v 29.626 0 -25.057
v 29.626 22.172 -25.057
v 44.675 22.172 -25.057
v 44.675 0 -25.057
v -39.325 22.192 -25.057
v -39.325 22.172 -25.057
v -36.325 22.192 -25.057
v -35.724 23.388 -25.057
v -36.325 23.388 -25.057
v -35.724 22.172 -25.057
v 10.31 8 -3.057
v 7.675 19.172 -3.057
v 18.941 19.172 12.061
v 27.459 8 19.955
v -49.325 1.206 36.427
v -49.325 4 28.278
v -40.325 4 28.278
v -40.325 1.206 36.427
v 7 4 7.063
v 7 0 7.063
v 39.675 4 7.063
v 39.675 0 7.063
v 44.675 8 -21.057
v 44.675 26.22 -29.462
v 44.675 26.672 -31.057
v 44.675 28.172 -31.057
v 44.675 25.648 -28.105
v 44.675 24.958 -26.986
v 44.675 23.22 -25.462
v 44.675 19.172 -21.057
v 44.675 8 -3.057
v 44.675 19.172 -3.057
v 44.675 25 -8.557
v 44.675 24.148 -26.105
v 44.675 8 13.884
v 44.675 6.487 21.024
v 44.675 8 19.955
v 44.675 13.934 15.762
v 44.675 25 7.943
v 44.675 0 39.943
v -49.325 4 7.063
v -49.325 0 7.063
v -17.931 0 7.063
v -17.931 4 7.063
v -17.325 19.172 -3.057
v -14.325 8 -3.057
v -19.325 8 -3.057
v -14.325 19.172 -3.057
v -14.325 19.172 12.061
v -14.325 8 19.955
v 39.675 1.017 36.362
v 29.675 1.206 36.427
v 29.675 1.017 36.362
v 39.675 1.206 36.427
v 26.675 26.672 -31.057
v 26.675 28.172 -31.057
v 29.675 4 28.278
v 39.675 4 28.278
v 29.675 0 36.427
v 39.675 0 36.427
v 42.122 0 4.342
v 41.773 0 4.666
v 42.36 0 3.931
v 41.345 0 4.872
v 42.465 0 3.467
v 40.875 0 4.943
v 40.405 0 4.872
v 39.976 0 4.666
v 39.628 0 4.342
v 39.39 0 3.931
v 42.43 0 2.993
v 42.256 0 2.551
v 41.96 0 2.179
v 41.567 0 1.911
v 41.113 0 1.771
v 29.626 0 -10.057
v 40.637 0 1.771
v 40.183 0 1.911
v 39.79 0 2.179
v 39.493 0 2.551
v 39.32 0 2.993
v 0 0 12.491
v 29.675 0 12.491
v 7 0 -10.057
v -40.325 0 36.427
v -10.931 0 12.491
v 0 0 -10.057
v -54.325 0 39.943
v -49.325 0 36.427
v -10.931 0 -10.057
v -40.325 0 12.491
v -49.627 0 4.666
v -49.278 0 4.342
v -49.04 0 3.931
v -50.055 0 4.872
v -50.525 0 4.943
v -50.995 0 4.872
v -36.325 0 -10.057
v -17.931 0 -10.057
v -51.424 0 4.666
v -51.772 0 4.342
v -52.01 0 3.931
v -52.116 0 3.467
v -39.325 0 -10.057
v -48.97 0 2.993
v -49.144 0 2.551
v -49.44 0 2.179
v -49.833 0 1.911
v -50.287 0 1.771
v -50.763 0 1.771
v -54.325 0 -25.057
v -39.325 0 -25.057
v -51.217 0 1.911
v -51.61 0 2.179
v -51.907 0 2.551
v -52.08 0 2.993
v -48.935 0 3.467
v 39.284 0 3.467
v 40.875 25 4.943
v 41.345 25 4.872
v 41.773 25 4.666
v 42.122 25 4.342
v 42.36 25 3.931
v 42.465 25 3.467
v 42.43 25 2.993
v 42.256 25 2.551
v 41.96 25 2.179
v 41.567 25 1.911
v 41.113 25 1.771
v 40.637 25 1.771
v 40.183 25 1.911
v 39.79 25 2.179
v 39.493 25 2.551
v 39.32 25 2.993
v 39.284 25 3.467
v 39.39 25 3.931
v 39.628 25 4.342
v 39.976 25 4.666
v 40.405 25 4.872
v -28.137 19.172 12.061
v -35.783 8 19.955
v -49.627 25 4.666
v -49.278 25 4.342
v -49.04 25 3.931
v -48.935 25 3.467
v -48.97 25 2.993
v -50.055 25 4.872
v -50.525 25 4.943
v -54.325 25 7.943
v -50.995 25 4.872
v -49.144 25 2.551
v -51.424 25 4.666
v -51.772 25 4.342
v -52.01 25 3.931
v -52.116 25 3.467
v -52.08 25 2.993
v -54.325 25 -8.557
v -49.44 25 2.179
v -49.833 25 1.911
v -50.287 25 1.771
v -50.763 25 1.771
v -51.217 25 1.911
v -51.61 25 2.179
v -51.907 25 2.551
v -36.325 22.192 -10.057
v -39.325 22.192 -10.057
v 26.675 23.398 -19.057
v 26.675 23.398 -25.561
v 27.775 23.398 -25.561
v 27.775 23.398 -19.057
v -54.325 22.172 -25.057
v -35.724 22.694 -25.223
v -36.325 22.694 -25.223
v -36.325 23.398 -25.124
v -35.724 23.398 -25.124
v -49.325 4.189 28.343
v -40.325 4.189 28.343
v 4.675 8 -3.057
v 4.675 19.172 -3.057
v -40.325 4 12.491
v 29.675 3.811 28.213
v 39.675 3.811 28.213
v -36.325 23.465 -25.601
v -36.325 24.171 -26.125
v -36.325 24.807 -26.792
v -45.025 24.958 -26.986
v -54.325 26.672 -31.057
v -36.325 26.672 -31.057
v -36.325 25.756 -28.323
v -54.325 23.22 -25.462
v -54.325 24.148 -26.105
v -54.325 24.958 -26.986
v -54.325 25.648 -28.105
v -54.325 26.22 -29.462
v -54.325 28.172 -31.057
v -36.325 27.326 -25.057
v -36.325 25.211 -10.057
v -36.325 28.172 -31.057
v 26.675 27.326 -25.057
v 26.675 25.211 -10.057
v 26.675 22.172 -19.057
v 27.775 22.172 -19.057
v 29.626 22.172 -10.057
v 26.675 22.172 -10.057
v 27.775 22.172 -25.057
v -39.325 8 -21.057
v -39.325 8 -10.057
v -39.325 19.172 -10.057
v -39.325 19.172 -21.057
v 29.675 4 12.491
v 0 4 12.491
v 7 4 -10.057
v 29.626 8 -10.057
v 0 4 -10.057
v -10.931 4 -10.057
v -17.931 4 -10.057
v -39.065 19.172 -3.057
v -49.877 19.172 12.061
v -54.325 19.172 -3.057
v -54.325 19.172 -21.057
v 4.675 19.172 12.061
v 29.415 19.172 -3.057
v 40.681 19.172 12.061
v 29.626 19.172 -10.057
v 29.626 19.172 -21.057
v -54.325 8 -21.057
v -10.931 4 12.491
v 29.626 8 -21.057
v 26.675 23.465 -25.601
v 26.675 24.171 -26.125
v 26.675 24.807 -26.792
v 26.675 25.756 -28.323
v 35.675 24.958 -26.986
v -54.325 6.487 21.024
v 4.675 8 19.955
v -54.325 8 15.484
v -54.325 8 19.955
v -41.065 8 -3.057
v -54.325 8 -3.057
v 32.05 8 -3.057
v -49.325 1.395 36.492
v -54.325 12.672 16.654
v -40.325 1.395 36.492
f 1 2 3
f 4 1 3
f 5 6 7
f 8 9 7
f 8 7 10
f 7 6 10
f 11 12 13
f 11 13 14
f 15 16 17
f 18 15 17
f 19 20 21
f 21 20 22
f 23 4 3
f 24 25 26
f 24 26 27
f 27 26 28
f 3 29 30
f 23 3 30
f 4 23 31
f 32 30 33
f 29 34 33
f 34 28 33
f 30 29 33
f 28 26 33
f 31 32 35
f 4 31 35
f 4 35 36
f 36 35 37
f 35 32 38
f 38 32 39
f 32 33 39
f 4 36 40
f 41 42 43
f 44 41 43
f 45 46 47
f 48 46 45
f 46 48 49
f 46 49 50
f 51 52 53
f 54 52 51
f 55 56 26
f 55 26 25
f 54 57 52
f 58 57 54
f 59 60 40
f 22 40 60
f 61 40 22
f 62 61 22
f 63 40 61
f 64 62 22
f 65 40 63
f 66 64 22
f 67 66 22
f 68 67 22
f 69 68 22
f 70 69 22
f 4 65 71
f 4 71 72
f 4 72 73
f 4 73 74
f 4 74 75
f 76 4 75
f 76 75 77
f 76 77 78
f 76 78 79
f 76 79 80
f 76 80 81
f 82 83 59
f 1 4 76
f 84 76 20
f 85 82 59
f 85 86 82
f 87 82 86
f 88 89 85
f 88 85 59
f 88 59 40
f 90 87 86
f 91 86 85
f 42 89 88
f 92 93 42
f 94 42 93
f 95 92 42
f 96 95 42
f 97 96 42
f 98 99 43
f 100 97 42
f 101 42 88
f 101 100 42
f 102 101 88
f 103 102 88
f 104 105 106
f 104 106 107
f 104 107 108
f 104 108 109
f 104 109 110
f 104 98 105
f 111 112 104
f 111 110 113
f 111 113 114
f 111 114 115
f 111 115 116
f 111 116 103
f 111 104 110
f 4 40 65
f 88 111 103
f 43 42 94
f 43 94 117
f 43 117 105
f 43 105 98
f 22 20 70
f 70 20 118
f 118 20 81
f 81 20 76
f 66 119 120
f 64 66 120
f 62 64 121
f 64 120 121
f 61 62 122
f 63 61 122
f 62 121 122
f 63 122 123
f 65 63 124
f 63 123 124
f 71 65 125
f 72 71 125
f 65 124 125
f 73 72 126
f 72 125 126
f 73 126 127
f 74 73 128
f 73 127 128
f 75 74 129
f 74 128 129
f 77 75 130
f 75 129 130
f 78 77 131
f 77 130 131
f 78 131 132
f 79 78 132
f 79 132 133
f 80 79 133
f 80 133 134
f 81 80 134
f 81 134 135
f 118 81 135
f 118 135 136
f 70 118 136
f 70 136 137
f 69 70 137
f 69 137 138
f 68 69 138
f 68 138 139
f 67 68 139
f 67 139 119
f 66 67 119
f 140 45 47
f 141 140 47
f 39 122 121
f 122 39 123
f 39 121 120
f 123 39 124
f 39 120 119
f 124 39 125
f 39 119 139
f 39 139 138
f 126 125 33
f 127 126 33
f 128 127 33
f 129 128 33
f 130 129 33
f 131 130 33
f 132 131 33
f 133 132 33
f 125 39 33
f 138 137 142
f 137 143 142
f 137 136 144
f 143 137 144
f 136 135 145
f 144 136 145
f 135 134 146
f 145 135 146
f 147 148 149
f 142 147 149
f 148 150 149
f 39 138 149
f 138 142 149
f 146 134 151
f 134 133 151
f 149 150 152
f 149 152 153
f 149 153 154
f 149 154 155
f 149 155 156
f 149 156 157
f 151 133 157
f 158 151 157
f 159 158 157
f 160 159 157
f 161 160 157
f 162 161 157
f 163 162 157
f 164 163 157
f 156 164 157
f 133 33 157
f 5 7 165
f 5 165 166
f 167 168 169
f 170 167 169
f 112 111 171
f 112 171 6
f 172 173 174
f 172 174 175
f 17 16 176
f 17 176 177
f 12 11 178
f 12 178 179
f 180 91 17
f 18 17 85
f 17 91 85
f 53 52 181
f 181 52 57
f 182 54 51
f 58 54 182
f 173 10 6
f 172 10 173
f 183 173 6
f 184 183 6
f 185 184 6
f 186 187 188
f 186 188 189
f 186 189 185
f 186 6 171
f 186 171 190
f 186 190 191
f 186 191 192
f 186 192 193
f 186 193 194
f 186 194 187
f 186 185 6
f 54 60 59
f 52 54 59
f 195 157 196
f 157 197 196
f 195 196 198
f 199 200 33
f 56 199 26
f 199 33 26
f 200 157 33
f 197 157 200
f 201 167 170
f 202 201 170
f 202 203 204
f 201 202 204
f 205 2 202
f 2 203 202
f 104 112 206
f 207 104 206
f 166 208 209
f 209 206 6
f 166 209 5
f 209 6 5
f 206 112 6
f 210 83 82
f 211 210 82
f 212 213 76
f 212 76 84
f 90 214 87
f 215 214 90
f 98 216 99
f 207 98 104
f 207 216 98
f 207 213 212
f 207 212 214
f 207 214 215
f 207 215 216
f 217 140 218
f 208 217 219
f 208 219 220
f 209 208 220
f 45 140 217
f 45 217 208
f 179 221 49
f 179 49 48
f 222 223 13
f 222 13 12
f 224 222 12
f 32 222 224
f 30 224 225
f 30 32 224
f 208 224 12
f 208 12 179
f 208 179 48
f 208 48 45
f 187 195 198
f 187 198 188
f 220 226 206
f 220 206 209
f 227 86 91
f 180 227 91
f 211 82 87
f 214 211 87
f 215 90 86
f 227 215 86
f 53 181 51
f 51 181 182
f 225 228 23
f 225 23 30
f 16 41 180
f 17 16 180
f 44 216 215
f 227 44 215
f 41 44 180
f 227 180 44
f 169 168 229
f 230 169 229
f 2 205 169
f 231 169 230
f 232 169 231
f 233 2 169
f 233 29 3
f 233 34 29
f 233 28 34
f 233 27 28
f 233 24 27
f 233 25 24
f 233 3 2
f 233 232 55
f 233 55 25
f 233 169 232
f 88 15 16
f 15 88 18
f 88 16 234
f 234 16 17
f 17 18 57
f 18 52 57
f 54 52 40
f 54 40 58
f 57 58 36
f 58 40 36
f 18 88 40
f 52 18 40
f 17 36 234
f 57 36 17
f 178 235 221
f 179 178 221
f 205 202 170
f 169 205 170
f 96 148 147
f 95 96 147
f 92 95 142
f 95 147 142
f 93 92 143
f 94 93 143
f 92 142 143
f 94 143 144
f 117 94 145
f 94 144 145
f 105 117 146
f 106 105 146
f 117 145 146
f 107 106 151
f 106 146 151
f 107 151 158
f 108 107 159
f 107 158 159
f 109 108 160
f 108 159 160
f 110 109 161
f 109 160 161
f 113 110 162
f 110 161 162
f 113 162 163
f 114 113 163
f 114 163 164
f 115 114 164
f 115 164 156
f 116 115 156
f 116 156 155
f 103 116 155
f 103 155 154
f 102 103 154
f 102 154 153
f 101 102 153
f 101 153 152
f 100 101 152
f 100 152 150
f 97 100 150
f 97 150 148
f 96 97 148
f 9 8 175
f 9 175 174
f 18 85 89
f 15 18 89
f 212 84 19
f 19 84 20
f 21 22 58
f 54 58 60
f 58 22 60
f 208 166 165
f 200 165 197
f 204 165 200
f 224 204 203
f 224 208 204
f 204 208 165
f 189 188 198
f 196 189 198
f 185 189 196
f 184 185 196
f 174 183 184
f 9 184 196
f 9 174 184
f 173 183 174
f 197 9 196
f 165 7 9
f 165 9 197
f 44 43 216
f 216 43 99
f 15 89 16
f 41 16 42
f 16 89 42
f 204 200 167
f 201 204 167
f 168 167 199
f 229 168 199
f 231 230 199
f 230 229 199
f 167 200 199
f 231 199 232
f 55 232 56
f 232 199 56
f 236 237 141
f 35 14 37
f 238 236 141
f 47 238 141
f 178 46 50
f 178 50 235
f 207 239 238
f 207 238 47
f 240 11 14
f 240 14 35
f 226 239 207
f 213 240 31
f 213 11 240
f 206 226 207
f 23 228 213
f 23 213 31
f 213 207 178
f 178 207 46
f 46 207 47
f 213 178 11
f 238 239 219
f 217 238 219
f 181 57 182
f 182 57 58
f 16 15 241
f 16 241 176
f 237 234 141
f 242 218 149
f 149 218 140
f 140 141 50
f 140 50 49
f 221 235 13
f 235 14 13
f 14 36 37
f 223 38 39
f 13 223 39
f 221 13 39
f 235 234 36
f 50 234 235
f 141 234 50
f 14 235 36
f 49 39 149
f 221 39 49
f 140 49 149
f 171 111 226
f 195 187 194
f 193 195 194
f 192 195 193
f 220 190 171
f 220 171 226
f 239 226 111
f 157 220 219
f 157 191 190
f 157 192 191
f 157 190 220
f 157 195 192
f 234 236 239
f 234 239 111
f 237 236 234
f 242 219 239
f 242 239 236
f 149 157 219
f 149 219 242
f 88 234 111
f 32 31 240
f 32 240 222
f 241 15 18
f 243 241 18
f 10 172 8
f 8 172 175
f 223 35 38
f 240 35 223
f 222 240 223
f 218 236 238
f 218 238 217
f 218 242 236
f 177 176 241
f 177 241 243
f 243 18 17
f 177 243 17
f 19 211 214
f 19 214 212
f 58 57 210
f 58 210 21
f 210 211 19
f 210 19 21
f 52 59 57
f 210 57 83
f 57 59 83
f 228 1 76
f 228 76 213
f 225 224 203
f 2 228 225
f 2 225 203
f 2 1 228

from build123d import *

# Parameters (mm, degrees)
BOSS_EXTRUDE2_DEPTH      = 25
SKETCH4_W                = 18
SKETCH4_H                = 11.172071032
CUT_EXTRUDE1_DEPTH       = 110.64235231
BOSS_EXTRUDE3_DEPTH      = 99
SKETCH6_W                = 63
SKETCH6_H                = 15
CUT_EXTRUDE2_DEPTH       = 99
SKETCH7_R                = 1.595
CUT_EXTRUDE3_DEPTH       = 72.914344682
CUT_EXTRUDE6_DEPTH       = 52
CUT_SWEEP3_START         = -47.833237702
CUT_SWEEP3_DEPTH         = 41.493253901
CUT_SWEEP4_START         = 1.791784621
CUT_SWEEP4_DEPTH         = 40.904021271
SKETCH18_W               = 63
SKETCH18_H               = 6.0593335
CUT_EXTRUDE8_DEPTH       = 70.563104286
CUT_EXTRUDE11_DEPTH      = 39
CUT_EXTRUDE11_DEPTH_BACK = 5
SKETCH19_W               = 63
SKETCH19_H               = 3.899399546
CUT_EXTRUDE12_DEPTH      = 6
CUT_EXTRUDE12_DEPTH_BACK = 39
SKETCH21_W               = 63.499017214
SKETCH21_H               = 3.594283993
CUT_EXTRUDE13_DEPTH      = 19
CUT_EXTRUDE13_DEPTH_BACK = 39
SKETCH22_W               = 63
SKETCH22_H               = 0.482139274
SKETCH23_W               = 3
SKETCH23_H               = 22.172071032
CUT_EXTRUDE14_DEPTH      = 15
SKETCH24_W               = 3
SKETCH24_H               = 22.191771217
CUT_EXTRUDE15_DEPTH      = 15
CUT_EXTRUDE16_DEPTH      = 4
SKETCH27_W               = 10
SKETCH27_H               = 8.614733054
BOSS_EXTRUDE5_DEPTH      = 0.2
SKETCH28_W               = 9
SKETCH28_H               = 8.614733054
BOSS_EXTRUDE6_DEPTH      = 0.2


with BuildPart() as part:
    # Sketch1 → Boss-Extrude2 (new body)
    with BuildSketch(Plane(origin=(0, 0, 0), x_dir=(1, 0, 0), z_dir=(0, 1, 0))):
        Polygon((26.674798416, 25.056972824), (44.674798416, 25.056972824), (44.674798416, -39.943027176), (-54.325201584, -39.943027176), (-54.325201584, 25.056972824), (-36.325201584, 25.056972824), (-36.325201584, 10.056972824), (26.674798416, 10.056972824), align=None)
    extrude(amount=BOSS_EXTRUDE2_DEPTH)

    # Sketch4 → Cut-Extrude1 (cut, through all)
    with BuildSketch(Plane(origin=(44.674798416, 0, 0), x_dir=(0, 0, -1), z_dir=(1, 0, 0))):
        Polygon((-39.943027176, 25), (-39.943027176, 0), (-21.024366767, 6.487240423), (-7.943027176, 25), align=None)
        with Locations((12.056972824, 13.586035516)):
            Rectangle(SKETCH4_W, SKETCH4_H)
    extrude(amount=-CUT_EXTRUDE1_DEPTH, mode=Mode.SUBTRACT)

    # Sketch5 → Boss-Extrude3 (add)
    with BuildSketch(Plane(origin=(44.674798416, 0, 0), x_dir=(0, 0, -1), z_dir=(1, 0, 0))):
        with BuildLine():
            Line((8.556972824, 25), (31.056972824, 28.172071032))
            Line((31.056972824, 28.172071032), (31.056972824, 26.672071032))
            add(Edge.make_bspline(
                [(25.056972824, 22.172071032), (25.914115681, 25.493499604), (31.056972824, 26.672071032)],
                knots=[0.285714286, 0.285714286, 0.285714286, 1, 1, 1], degree=2))
            Line((25.056972824, 22.172071032), (25.056972824, 25))
            Line((25.056972824, 25), (8.556972824, 25))
        make_face()
    extrude(amount=-BOSS_EXTRUDE3_DEPTH)

    # Sketch6 → Cut-Extrude2 (cut)
    with BuildSketch(Plane.XZ.offset(-25)):
        with Locations((-4.825201584, -17.556972824)):
            Rectangle(SKETCH6_W, SKETCH6_H)
    extrude(amount=-CUT_EXTRUDE2_DEPTH, mode=Mode.SUBTRACT)

    # Sketch7 → Cut-Extrude3 (cut, through all)
    with BuildSketch(Plane(origin=(0, 25, 0), x_dir=(1, 0, 0), z_dir=(0, 1, 0))):
        with Locations(Location((40.874798416, -3.348027176, 0), (0, 0, 270))):
            Circle(SKETCH7_R)
        with Locations(Location((-50.525201584, -3.348027176, 0), (0, 0, 270))):
            Circle(SKETCH7_R)
    extrude(amount=-CUT_EXTRUDE3_DEPTH, mode=Mode.SUBTRACT)

    # Sketch9 → Cut-Extrude6 (cut)
    with BuildSketch(Plane(origin=(0, 0, -3.056972824), x_dir=(-1, 0, 0), z_dir=(0, 0, -1))):
        Polygon((4.825201584, 19.172071032), (14.325201584, 19.172071032), (14.325201584, 8), (4.825201584, 8), (-4.674798416, 8), (-4.674798416, 19.172071032), align=None)
    extrude(amount=-CUT_EXTRUDE6_DEPTH, mode=Mode.SUBTRACT)

    # Cut-Sweep3: read off the stored shape, not the designer's step
    # Cut-Sweep3 outline → Cut-Sweep3 (cut)
    with BuildSketch(Plane(origin=(0, 0, 0), x_dir=(0.8133953590059209, 0, 0.5817112599457132), z_dir=(0.5817112599457132, 0, -0.8133953590059209)).offset(CUT_SWEEP3_START)):
        Polygon((-17.497304793, -8), (-35.180519898, -8), (-33.55372918, -19.172071032), (-15.870514075, -19.172071032), align=None)
    extrude(amount=CUT_SWEEP3_DEPTH, mode=Mode.SUBTRACT)

    # Cut-Sweep4: read off the stored shape, not the designer's step
    # Cut-Sweep4 outline → Cut-Sweep4 (cut)
    with BuildSketch(Plane(origin=(0, 0, 0), x_dir=(0.8018445876826973, 0, -0.5975326411201026), z_dir=(0.5975326411201026, 0, 0.8018445876826972)).offset(CUT_SWEEP4_START)):
        Polygon((10.094047266, 8), (27.526148602, 8), (25.412737953, 19.172071032), (7.980636617, 19.172071032), align=None)
    extrude(amount=CUT_SWEEP4_DEPTH, mode=Mode.SUBTRACT)

    # Sketch18 → Cut-Extrude8 (cut, through all)
    with BuildSketch(Plane(origin=(0, 23.329932997, 3.289075762), x_dir=(1, 0, 0), z_dir=(0, 0.9902079164509707, 0.1396004376706153))):
        with Locations((-4.825201584, 31.656027047)):
            Rectangle(SKETCH18_W, SKETCH18_H)
    extrude(amount=-CUT_EXTRUDE8_DEPTH, mode=Mode.SUBTRACT)

    # Sketch19 → Cut-Extrude11 (cut, two sides: drawn at the far end of the back side and taken through both)
    with BuildSketch(Plane(origin=(0, 3.996252426, -28.346048585), x_dir=(-1, 0, 0), z_dir=(0, 0.13960043767061533, -0.9902079164509707)).offset(-CUT_EXTRUDE11_DEPTH_BACK)):
        with Locations((4.825201584, 21.610940987)):
            Rectangle(SKETCH19_W, SKETCH19_H)
    extrude(amount=CUT_EXTRUDE11_DEPTH + CUT_EXTRUDE11_DEPTH_BACK, mode=Mode.SUBTRACT)

    # Sketch21 → Cut-Extrude12 (cut, two sides: drawn at the far end of the back side and taken through both)
    with BuildSketch(Plane.XY.offset(-25.056972824).offset(-CUT_EXTRUDE12_DEPTH_BACK)):
        with Locations((-3.974900461, 21.600520274)):
            Rectangle(SKETCH21_W, SKETCH21_H)
    extrude(amount=CUT_EXTRUDE12_DEPTH + CUT_EXTRUDE12_DEPTH_BACK, mode=Mode.SUBTRACT)

    # Sketch22 → Cut-Extrude13 (cut, two sides: drawn at the far end of the back side and taken through both)
    with BuildSketch(Plane(origin=(0, 19.468716697, 2.744717879), x_dir=(1, 0, 0), z_dir=(0, 0.9902079164509707, 0.13960043767061536)).offset(-CUT_EXTRUDE13_DEPTH_BACK)):
        with Locations((-4.825201584, 28.38529066)):
            Rectangle(SKETCH22_W, SKETCH22_H)
    extrude(amount=CUT_EXTRUDE13_DEPTH + CUT_EXTRUDE13_DEPTH_BACK, mode=Mode.SUBTRACT)

    # Sketch23 → Cut-Extrude14 (cut)
    with BuildSketch(Plane(origin=(0, 0, -25.056972824), x_dir=(-1, 0, 0), z_dir=(0, 0, -1))):
        with Locations((-28.126300659, 11.086035516)):
            Rectangle(SKETCH23_W, SKETCH23_H)
    extrude(amount=-CUT_EXTRUDE14_DEPTH, mode=Mode.SUBTRACT)

    # Sketch24 → Cut-Extrude15 (cut)
    with BuildSketch(Plane(origin=(0, 0, -25.056972824), x_dir=(-1, 0, 0), z_dir=(0, 0, -1))):
        with Locations((37.825201584, 11.095885609)):
            Rectangle(SKETCH24_W, SKETCH24_H)
    extrude(amount=-CUT_EXTRUDE15_DEPTH, mode=Mode.SUBTRACT)

    # Sketch25 → Cut-Extrude16 (cut)
    with BuildSketch(Plane.XZ):
        Polygon((-40.325201584, 36.426836245), (-49.325201584, 36.426836245), (-49.325201584, 30.426836245), (-49.325201584, 7.062865475), (-17.931146708, 7.062865475), (-17.931146708, -10.056972824), (-10.931146708, -10.056972824), (-10.931146708, 12.49099165), (-40.325201584, 12.49099165), (-40.325201584, 30.426836245), align=None)
        Polygon((0, 12.49099165), (0, -10.056972824), (7, -10.056972824), (7, 7.062865475), (39.674798416, 7.062865475), (39.674798416, 30.426836245), (39.674798416, 36.426836245), (29.674798416, 36.426836245), (29.674798416, 30.426836245), (29.674798416, 12.49099165), align=None)
    extrude(amount=-CUT_EXTRUDE16_DEPTH, mode=Mode.SUBTRACT)


with BuildPart() as body_2:
    # Sketch27 → Boss-Extrude5 (new body)
    with BuildSketch(Plane(origin=(0, 12.255509184, 4.202434679), x_dir=(1, 0, 0), z_dir=(0, 0.9459330204787307, 0.32436202115535245))):
        with Locations((34.674798416, -29.758894898)):
            Rectangle(SKETCH27_W, SKETCH27_H)
    extrude(amount=-BOSS_EXTRUDE5_DEPTH)


with BuildPart() as body_3:
    # Sketch28 → Boss-Extrude6 (new body)
    with BuildSketch(Plane(origin=(0, 12.255509184, 4.202434679), x_dir=(1, 0, 0), z_dir=(0, 0.9459330204787307, 0.32436202115535245))):
        with Locations((-44.825201584, -29.758894898)):
            Rectangle(SKETCH28_W, SKETCH28_H)
    extrude(amount=BOSS_EXTRUDE6_DEPTH)


solid = Compound([part.part, body_2.part, body_3.part])
